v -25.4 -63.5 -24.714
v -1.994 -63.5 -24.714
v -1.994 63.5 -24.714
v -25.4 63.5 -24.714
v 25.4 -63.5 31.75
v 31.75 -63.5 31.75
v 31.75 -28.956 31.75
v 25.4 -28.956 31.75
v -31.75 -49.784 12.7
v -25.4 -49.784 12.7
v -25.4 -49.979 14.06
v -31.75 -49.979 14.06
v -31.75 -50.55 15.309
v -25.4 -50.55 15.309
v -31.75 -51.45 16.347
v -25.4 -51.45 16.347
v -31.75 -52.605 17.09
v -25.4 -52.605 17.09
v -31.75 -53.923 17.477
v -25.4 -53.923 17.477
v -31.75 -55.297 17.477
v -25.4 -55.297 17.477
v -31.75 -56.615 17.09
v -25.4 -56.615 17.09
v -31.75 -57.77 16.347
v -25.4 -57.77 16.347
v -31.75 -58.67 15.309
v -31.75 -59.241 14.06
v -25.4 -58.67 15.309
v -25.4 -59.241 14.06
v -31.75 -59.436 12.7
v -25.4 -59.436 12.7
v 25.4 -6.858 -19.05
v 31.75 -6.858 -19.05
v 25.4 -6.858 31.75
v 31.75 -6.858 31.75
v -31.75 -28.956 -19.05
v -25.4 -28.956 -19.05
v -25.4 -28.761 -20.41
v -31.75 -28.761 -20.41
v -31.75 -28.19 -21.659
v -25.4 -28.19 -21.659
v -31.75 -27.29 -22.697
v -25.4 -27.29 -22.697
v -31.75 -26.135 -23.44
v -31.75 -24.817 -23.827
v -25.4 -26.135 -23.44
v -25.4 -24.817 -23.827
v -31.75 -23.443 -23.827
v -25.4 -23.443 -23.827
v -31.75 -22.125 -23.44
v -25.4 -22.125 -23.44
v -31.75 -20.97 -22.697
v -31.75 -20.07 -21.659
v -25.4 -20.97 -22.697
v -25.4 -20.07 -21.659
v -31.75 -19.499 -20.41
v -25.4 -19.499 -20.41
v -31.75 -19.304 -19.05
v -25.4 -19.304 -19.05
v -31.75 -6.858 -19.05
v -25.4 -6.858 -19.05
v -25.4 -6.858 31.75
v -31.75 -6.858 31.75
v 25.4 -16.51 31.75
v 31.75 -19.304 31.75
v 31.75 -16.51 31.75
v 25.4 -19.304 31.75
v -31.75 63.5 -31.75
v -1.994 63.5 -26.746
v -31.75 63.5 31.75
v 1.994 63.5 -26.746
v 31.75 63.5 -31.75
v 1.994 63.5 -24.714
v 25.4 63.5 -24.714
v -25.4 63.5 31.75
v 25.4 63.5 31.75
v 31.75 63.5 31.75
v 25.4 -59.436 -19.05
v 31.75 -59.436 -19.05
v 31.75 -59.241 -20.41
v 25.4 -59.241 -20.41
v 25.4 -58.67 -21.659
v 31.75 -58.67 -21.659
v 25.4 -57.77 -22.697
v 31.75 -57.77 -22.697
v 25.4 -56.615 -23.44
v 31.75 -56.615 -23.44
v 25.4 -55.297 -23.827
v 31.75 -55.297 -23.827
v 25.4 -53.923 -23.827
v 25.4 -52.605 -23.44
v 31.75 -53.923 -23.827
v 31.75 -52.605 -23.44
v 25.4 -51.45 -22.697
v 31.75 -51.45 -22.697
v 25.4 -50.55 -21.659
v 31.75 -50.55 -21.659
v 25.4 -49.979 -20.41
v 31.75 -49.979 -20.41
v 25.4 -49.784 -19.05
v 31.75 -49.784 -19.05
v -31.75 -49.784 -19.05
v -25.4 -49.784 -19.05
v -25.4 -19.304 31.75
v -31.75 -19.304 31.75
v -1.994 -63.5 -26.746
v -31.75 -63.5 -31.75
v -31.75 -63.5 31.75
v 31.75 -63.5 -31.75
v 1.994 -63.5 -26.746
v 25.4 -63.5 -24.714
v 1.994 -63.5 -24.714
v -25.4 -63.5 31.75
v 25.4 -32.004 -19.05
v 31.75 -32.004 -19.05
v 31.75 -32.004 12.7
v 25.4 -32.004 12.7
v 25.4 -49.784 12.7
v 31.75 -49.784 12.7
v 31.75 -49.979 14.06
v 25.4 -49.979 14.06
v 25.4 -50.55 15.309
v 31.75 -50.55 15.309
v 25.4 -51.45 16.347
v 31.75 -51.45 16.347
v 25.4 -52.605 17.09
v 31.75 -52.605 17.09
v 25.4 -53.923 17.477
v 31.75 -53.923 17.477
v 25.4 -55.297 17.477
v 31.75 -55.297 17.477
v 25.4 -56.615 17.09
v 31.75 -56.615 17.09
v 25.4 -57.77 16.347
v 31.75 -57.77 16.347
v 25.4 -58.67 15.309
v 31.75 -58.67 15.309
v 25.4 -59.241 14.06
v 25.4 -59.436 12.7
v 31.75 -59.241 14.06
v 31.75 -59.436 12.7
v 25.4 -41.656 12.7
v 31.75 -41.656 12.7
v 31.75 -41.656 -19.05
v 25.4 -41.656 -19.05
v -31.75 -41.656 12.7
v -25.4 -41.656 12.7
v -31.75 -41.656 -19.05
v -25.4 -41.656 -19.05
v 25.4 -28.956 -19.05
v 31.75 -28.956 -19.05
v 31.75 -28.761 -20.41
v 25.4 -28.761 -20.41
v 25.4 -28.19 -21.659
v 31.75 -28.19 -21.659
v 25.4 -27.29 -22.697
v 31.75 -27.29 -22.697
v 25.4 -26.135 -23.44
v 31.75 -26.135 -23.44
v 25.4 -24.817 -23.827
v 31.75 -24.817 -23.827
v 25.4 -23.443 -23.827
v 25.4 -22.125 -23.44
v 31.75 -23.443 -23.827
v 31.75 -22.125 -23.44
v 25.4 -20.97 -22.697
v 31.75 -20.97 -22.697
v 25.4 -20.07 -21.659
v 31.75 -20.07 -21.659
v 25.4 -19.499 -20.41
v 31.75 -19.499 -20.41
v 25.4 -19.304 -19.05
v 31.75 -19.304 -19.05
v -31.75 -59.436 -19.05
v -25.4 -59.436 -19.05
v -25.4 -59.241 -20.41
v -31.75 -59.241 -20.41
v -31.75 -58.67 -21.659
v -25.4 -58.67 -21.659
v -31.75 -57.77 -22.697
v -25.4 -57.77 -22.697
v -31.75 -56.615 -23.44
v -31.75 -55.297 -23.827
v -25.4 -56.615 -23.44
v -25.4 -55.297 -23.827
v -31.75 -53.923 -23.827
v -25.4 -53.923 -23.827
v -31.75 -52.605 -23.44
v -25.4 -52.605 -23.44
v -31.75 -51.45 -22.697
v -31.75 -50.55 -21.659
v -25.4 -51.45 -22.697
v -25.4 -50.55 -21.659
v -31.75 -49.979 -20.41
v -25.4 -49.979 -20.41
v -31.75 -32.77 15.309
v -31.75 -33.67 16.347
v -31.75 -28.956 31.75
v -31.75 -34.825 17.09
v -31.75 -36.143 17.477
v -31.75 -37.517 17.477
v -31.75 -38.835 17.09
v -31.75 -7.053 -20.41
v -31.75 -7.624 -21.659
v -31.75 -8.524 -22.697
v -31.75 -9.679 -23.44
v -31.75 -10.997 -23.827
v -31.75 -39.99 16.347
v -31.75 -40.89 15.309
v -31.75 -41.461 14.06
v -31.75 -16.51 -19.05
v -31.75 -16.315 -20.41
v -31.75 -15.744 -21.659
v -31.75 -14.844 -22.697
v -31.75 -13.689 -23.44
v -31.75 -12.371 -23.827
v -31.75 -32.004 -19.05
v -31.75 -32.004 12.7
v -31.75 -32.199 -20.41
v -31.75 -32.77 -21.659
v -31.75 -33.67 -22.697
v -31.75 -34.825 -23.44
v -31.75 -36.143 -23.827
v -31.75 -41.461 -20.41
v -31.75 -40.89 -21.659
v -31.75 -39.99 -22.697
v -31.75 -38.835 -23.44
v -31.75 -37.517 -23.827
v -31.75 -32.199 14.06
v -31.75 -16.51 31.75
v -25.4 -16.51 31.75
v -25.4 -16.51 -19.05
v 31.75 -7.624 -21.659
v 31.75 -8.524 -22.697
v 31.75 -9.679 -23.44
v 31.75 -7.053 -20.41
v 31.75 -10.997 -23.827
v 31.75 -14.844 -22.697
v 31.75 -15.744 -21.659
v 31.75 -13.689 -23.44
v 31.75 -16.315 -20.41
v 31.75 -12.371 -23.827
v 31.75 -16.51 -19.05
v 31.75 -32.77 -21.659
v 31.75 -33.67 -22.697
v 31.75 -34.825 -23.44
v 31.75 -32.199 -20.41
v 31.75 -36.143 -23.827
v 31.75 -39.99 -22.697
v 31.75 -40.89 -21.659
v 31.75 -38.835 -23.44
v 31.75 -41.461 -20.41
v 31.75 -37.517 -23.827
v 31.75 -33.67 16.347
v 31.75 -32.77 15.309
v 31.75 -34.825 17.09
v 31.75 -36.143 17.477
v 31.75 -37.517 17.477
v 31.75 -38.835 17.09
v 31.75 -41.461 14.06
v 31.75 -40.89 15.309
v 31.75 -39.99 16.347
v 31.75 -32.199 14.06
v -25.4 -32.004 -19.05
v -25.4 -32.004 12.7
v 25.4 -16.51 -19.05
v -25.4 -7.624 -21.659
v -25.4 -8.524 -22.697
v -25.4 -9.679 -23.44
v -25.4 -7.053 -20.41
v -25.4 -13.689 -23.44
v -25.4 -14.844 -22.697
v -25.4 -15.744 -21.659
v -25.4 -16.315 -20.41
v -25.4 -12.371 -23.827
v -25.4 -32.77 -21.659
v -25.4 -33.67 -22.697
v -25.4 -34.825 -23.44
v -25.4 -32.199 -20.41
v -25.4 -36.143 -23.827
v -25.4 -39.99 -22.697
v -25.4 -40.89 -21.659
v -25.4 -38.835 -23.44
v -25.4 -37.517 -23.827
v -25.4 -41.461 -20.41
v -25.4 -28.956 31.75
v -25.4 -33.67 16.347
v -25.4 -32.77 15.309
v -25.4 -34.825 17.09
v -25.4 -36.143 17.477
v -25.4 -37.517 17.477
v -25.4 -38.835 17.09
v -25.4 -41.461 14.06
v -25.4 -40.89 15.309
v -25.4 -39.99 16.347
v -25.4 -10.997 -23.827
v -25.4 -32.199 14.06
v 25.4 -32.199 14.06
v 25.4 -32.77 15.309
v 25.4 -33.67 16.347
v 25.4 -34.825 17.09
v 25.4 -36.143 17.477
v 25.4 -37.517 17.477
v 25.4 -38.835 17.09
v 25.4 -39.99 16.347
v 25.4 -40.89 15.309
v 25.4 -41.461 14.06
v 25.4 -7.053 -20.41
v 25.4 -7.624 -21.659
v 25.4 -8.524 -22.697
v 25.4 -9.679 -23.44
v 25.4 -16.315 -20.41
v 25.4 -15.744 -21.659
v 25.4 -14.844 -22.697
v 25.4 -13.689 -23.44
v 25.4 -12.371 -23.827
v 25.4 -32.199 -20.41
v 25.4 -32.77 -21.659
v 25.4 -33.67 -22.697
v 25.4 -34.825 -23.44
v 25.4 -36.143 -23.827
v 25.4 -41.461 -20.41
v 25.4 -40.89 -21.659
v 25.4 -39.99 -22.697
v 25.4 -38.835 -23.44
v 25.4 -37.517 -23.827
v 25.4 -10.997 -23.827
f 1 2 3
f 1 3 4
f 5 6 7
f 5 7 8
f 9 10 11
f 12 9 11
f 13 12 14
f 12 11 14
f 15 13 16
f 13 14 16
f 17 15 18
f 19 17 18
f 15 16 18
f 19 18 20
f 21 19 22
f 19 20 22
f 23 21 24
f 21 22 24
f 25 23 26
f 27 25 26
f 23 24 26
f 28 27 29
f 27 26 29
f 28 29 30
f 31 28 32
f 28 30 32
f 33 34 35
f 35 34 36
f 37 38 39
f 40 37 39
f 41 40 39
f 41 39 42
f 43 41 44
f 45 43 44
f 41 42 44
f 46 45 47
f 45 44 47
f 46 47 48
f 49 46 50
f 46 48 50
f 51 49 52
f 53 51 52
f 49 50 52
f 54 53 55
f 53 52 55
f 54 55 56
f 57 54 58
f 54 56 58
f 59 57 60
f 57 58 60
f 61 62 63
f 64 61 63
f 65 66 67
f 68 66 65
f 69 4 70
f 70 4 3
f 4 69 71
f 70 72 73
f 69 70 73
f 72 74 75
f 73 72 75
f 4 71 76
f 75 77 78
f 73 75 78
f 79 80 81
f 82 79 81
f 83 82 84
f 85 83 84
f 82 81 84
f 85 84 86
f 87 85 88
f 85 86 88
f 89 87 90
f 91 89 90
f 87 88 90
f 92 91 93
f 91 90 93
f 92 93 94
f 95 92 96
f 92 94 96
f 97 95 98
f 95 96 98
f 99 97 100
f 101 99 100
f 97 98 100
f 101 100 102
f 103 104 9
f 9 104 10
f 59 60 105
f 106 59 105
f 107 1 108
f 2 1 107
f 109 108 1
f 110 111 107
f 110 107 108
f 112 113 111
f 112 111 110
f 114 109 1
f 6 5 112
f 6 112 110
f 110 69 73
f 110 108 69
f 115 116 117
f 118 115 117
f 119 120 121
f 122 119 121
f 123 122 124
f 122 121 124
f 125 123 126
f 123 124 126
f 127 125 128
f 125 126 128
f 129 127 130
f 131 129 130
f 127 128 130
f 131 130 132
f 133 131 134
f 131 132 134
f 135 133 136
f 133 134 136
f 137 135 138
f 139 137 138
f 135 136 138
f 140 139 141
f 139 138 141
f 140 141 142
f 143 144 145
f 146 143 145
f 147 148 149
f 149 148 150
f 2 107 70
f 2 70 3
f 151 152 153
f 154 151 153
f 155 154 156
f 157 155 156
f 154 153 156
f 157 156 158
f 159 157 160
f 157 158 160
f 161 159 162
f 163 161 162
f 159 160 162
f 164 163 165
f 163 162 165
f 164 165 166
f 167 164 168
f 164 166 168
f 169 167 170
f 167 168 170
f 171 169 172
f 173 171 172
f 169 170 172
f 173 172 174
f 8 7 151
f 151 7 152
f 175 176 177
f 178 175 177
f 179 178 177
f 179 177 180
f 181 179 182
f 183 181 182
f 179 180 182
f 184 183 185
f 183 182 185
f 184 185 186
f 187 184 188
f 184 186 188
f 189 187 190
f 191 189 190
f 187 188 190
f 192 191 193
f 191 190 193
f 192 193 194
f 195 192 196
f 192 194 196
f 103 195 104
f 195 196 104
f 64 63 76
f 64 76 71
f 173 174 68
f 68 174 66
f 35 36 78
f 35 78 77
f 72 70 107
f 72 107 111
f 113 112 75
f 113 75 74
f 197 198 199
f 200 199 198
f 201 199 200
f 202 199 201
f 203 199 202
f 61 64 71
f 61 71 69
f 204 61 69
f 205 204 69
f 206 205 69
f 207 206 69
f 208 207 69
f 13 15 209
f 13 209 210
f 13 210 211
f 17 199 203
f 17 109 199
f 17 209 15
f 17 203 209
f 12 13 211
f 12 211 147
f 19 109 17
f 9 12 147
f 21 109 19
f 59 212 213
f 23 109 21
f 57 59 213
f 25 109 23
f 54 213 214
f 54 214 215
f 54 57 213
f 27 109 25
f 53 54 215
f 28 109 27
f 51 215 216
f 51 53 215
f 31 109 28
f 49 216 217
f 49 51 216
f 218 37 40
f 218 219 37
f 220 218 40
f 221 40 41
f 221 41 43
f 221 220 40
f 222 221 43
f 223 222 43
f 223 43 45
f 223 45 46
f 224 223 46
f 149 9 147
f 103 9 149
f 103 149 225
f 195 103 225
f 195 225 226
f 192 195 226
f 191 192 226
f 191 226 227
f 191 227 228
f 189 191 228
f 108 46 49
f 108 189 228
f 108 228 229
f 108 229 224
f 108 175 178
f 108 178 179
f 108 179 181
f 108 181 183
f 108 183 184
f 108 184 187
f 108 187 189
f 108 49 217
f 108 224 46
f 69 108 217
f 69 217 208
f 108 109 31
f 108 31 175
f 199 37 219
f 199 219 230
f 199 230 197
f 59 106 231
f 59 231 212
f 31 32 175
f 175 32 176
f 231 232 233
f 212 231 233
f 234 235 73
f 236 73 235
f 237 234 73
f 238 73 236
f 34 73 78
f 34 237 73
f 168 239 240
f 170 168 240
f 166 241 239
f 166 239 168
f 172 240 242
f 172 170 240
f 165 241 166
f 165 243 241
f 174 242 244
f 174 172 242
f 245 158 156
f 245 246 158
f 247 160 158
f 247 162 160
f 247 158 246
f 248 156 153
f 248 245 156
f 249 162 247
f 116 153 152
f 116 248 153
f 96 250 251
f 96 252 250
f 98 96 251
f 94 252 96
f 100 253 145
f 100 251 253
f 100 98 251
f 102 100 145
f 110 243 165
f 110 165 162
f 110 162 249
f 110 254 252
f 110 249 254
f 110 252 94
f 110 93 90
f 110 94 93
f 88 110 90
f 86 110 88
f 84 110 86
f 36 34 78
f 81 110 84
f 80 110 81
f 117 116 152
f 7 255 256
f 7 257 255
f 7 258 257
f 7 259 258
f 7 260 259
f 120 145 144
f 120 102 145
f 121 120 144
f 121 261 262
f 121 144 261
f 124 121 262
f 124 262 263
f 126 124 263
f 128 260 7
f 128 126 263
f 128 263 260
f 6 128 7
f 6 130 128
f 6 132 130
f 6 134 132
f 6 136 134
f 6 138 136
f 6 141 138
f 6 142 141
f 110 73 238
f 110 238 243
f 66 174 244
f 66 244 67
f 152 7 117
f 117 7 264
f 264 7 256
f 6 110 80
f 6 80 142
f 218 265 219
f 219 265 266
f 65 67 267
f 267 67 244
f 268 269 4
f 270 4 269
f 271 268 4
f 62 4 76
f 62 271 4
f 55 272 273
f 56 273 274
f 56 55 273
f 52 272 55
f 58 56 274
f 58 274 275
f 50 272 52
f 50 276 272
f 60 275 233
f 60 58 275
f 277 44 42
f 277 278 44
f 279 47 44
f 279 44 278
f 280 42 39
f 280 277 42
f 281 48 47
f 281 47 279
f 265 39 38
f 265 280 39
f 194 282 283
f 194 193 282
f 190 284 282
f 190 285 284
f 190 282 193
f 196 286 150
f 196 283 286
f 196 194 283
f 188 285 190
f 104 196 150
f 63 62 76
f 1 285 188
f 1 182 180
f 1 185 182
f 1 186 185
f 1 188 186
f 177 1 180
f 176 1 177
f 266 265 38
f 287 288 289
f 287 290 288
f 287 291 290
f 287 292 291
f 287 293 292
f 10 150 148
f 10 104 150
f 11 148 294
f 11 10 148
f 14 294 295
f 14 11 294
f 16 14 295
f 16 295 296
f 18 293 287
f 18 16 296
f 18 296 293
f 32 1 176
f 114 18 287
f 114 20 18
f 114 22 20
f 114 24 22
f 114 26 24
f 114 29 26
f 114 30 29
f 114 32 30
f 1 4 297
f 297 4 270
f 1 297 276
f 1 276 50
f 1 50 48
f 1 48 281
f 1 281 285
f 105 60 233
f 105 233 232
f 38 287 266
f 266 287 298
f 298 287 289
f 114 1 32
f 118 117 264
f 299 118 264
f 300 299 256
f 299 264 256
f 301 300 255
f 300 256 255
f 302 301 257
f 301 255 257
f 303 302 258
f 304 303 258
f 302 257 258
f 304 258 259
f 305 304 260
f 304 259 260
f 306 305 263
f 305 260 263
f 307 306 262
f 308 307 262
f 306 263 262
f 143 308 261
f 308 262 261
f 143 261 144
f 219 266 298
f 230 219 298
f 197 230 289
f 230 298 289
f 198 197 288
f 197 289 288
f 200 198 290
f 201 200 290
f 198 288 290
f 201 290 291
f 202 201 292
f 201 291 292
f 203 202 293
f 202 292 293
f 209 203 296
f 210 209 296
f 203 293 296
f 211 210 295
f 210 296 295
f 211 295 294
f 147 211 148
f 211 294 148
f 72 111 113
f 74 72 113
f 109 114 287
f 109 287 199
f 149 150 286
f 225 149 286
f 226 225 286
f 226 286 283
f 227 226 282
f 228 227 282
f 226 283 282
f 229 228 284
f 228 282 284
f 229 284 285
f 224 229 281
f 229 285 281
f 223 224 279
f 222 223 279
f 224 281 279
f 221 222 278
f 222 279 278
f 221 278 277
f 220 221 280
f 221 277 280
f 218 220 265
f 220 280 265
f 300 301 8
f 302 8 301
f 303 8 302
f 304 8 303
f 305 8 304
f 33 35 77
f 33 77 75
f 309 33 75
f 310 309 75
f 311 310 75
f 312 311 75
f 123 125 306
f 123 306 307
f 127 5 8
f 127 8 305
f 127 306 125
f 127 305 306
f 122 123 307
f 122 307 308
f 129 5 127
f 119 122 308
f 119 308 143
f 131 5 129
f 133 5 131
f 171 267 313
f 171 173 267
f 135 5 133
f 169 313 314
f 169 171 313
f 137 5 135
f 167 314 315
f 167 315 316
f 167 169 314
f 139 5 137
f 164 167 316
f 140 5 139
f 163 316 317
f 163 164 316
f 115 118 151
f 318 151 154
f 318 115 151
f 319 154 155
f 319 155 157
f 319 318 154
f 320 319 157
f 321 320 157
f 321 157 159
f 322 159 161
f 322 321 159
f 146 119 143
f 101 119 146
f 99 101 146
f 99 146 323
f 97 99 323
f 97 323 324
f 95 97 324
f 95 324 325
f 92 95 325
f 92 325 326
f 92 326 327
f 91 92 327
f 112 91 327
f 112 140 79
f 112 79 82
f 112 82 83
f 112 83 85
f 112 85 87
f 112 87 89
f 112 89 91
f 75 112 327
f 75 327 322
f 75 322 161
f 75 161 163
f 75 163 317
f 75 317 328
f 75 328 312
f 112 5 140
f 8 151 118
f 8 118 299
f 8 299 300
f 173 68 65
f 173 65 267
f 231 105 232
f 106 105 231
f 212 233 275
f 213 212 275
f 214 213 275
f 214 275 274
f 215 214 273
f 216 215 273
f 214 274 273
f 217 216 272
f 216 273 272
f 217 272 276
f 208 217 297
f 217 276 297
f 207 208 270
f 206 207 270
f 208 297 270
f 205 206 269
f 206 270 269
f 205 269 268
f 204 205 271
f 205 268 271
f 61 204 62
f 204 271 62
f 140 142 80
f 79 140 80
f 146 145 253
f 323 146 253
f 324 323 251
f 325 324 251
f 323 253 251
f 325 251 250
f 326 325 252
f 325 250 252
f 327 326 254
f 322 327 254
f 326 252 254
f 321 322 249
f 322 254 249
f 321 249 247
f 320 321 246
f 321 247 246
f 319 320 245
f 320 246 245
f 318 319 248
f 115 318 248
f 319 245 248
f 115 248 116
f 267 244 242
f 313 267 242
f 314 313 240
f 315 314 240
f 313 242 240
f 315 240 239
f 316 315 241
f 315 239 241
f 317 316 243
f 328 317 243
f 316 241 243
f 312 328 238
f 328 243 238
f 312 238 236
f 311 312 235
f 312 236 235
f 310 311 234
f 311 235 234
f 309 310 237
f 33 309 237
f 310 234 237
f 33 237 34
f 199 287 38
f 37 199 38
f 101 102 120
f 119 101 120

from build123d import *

# Parameters (mm, degrees)
F1_DEPTH = 63.5
F3_DEPTH = 63.501
F4_W     = 3.9878
F4_H     = 2.032
F5_DEPTH = 63.5
F7_DEPTH = 63.501


with BuildPart() as f1:
    # F0 (on Front) → F1 (new body, symmetric)
    with BuildSketch(Plane.XZ):
        Polygon((31.75, -31.75), (31.75, 31.75), (25.4, 31.75), (25.4, -24.7142), (-25.4, -24.7142), (-25.4, 31.75), (-31.75, 31.75), (-31.75, -31.75), align=None)
    extrude(amount=F1_DEPTH, both=True)

    # F2 (on face) → F3 (cut, through all)
    with BuildSketch(Plane.YZ.offset(31.75)):
        with BuildLine():
            ThreePointArc((-59.436, 12.7), (-54.61, 7.874), (-49.784, 12.7))
            ThreePointArc((-49.784, 12.7), (-54.61, 17.526), (-59.436, 12.7))
        make_face()
        with BuildLine():
            Line((-49.784, -19.05), (-49.784, 12.7))
            ThreePointArc((-49.784, 12.7), (-54.61, 7.874), (-59.436, 12.7))
            Line((-59.436, 12.7), (-59.436, -19.05))
            ThreePointArc((-59.436, -19.05), (-54.61, -14.224), (-49.784, -19.05))
        make_face()
        with BuildLine():
            ThreePointArc((-59.436, -19.05), (-54.61, -23.876), (-49.784, -19.05))
            ThreePointArc((-49.784, -19.05), (-54.61, -14.224), (-59.436, -19.05))
        make_face()
        with BuildLine():
            ThreePointArc((-41.656, 12.7), (-36.83, 7.874), (-32.004, 12.7))
            ThreePointArc((-32.004, 12.7), (-36.83, 17.526), (-41.656, 12.7))
        make_face()
        with BuildLine():
            Line((-32.004, -19.05), (-32.004, 12.7))
            ThreePointArc((-32.004, 12.7), (-36.83, 7.874), (-41.656, 12.7))
            Line((-41.656, 12.7), (-41.656, -19.05))
            ThreePointArc((-41.656, -19.05), (-36.83, -14.224), (-32.004, -19.05))
        make_face()
        with BuildLine():
            ThreePointArc((-41.656, -19.05), (-36.83, -23.876), (-32.004, -19.05))
            ThreePointArc((-32.004, -19.05), (-36.83, -14.224), (-41.656, -19.05))
        make_face()
    extrude(amount=-F3_DEPTH, mode=Mode.SUBTRACT)

    # F4 (on Front) → F5 (cut, symmetric)
    with BuildSketch(Plane.XZ):
        with Locations((0, -25.7302)):
            Rectangle(F4_W, F4_H)
    extrude(amount=F5_DEPTH, both=True, mode=Mode.SUBTRACT)

    # F6 (on face) → F7 (cut, through all)
    with BuildSketch(Plane.YZ.offset(31.75)):
        with BuildLine():
            ThreePointArc((-28.956, -19.05), (-24.13, -23.876), (-19.304, -19.05))
            ThreePointArc((-19.304, -19.05), (-24.13, -14.224), (-28.956, -19.05))
        make_face()
        with BuildLine():
            ThreePointArc((-16.51, -19.05), (-11.684, -23.876), (-6.858, -19.05))
            ThreePointArc((-6.858, -19.05), (-11.684, -14.224), (-16.51, -19.05))
        make_face()
        with BuildLine():
            ThreePointArc((-28.956, -19.05), (-24.13, -14.224), (-19.304, -19.05))
            Line((-19.304, -19.05), (-19.304, 31.75))
            Line((-19.304, 31.75), (-28.956, 31.75))
            Line((-28.956, 31.75), (-28.956, -19.05))
        make_face()
        with BuildLine():
            Line((-6.858, 31.75), (-16.51, 31.75))
            Line((-16.51, 31.75), (-16.51, -19.05))
            ThreePointArc((-16.51, -19.05), (-11.684, -14.224), (-6.858, -19.05))
            Line((-6.858, -19.05), (-6.858, 31.75))
        make_face()
    extrude(amount=-F7_DEPTH, mode=Mode.SUBTRACT)


solid = f1.part
